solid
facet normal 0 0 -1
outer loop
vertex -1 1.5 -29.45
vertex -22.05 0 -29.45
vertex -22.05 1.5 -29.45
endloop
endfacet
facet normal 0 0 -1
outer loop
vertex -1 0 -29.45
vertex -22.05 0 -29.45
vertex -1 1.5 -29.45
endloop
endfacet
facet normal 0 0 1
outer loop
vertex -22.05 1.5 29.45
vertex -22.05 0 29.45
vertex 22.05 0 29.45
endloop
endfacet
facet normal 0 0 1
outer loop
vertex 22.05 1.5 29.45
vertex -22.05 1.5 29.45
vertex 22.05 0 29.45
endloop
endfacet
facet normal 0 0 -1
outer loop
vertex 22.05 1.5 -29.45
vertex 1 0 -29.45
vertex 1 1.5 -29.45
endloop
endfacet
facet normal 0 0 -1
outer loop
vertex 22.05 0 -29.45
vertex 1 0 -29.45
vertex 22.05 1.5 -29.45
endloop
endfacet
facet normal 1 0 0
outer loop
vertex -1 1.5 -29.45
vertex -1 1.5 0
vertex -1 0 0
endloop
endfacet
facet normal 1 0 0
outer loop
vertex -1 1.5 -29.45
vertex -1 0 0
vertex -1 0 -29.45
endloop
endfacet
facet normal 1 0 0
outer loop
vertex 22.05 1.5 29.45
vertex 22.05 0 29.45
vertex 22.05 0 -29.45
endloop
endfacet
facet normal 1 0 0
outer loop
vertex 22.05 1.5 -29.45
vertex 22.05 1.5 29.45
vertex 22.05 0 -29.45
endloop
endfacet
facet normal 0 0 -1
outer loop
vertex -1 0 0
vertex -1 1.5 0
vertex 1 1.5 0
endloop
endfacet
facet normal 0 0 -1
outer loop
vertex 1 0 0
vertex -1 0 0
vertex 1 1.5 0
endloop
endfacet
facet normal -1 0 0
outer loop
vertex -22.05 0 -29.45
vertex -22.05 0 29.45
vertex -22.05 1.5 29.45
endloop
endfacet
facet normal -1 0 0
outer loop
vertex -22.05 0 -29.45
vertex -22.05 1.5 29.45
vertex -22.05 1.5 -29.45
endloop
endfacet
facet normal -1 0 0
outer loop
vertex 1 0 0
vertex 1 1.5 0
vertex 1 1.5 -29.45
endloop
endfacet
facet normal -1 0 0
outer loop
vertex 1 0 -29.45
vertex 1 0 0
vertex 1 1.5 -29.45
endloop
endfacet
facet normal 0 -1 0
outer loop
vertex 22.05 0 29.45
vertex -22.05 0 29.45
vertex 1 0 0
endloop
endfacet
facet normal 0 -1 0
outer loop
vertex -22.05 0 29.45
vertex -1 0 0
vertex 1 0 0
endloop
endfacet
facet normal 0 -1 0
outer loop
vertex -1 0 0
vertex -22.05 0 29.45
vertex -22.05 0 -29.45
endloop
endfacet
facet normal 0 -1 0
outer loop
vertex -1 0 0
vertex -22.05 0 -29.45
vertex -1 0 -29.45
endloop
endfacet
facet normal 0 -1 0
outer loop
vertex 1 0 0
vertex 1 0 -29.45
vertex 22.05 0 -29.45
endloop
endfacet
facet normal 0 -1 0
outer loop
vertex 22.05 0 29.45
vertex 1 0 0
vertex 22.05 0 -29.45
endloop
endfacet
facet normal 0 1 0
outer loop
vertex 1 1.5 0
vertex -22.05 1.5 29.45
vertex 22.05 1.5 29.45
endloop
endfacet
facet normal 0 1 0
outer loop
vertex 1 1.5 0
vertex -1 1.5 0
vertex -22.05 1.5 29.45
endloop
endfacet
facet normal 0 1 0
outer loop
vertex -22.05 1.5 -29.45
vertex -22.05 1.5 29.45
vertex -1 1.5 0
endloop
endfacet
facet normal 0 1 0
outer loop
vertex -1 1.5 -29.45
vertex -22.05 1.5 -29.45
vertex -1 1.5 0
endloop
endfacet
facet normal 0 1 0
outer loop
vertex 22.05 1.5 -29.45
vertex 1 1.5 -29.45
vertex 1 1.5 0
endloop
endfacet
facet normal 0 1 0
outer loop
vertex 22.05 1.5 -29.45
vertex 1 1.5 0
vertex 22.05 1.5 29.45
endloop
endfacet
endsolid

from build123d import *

# Parameters (mm, degrees)
SKETCH1_W           = 44.1
SKETCH1_H           = 58.9
BOSS_EXTRUDE1_DEPTH = 1.5
CUT_EXTRUDE1_REACH  = 38.821
SKETCH2_W           = 2
SKETCH2_H           = 29.45


with BuildPart() as part:
    # Sketch1 → Boss-Extrude1 (new body)
    with BuildSketch(Plane(origin=(0, 0, 0), x_dir=(1, 0, 0), z_dir=(0, 1, 0))):
        Rectangle(SKETCH1_W, SKETCH1_H)
    extrude(amount=BOSS_EXTRUDE1_DEPTH)

    # Sketch2 → Cut-Extrude1 (cut, up to next)
    with BuildSketch(Plane(origin=(0, 1.5, 0), x_dir=(1, 0, 0), z_dir=(0, 1, 0)), mode=Mode.PRIVATE) as cut_extrude1_sk1:
        with Locations((0, 14.725)):
            Rectangle(SKETCH2_W, SKETCH2_H)
    cut_extrude1_tool1 = extrude(cut_extrude1_sk1.sketch, amount=-CUT_EXTRUDE1_REACH, mode=Mode.PRIVATE) & part.part
    add(cut_extrude1_tool1.solids().sort_by_distance((0, 1.5, -14.725))[0], mode=Mode.SUBTRACT)


solid = part.part
